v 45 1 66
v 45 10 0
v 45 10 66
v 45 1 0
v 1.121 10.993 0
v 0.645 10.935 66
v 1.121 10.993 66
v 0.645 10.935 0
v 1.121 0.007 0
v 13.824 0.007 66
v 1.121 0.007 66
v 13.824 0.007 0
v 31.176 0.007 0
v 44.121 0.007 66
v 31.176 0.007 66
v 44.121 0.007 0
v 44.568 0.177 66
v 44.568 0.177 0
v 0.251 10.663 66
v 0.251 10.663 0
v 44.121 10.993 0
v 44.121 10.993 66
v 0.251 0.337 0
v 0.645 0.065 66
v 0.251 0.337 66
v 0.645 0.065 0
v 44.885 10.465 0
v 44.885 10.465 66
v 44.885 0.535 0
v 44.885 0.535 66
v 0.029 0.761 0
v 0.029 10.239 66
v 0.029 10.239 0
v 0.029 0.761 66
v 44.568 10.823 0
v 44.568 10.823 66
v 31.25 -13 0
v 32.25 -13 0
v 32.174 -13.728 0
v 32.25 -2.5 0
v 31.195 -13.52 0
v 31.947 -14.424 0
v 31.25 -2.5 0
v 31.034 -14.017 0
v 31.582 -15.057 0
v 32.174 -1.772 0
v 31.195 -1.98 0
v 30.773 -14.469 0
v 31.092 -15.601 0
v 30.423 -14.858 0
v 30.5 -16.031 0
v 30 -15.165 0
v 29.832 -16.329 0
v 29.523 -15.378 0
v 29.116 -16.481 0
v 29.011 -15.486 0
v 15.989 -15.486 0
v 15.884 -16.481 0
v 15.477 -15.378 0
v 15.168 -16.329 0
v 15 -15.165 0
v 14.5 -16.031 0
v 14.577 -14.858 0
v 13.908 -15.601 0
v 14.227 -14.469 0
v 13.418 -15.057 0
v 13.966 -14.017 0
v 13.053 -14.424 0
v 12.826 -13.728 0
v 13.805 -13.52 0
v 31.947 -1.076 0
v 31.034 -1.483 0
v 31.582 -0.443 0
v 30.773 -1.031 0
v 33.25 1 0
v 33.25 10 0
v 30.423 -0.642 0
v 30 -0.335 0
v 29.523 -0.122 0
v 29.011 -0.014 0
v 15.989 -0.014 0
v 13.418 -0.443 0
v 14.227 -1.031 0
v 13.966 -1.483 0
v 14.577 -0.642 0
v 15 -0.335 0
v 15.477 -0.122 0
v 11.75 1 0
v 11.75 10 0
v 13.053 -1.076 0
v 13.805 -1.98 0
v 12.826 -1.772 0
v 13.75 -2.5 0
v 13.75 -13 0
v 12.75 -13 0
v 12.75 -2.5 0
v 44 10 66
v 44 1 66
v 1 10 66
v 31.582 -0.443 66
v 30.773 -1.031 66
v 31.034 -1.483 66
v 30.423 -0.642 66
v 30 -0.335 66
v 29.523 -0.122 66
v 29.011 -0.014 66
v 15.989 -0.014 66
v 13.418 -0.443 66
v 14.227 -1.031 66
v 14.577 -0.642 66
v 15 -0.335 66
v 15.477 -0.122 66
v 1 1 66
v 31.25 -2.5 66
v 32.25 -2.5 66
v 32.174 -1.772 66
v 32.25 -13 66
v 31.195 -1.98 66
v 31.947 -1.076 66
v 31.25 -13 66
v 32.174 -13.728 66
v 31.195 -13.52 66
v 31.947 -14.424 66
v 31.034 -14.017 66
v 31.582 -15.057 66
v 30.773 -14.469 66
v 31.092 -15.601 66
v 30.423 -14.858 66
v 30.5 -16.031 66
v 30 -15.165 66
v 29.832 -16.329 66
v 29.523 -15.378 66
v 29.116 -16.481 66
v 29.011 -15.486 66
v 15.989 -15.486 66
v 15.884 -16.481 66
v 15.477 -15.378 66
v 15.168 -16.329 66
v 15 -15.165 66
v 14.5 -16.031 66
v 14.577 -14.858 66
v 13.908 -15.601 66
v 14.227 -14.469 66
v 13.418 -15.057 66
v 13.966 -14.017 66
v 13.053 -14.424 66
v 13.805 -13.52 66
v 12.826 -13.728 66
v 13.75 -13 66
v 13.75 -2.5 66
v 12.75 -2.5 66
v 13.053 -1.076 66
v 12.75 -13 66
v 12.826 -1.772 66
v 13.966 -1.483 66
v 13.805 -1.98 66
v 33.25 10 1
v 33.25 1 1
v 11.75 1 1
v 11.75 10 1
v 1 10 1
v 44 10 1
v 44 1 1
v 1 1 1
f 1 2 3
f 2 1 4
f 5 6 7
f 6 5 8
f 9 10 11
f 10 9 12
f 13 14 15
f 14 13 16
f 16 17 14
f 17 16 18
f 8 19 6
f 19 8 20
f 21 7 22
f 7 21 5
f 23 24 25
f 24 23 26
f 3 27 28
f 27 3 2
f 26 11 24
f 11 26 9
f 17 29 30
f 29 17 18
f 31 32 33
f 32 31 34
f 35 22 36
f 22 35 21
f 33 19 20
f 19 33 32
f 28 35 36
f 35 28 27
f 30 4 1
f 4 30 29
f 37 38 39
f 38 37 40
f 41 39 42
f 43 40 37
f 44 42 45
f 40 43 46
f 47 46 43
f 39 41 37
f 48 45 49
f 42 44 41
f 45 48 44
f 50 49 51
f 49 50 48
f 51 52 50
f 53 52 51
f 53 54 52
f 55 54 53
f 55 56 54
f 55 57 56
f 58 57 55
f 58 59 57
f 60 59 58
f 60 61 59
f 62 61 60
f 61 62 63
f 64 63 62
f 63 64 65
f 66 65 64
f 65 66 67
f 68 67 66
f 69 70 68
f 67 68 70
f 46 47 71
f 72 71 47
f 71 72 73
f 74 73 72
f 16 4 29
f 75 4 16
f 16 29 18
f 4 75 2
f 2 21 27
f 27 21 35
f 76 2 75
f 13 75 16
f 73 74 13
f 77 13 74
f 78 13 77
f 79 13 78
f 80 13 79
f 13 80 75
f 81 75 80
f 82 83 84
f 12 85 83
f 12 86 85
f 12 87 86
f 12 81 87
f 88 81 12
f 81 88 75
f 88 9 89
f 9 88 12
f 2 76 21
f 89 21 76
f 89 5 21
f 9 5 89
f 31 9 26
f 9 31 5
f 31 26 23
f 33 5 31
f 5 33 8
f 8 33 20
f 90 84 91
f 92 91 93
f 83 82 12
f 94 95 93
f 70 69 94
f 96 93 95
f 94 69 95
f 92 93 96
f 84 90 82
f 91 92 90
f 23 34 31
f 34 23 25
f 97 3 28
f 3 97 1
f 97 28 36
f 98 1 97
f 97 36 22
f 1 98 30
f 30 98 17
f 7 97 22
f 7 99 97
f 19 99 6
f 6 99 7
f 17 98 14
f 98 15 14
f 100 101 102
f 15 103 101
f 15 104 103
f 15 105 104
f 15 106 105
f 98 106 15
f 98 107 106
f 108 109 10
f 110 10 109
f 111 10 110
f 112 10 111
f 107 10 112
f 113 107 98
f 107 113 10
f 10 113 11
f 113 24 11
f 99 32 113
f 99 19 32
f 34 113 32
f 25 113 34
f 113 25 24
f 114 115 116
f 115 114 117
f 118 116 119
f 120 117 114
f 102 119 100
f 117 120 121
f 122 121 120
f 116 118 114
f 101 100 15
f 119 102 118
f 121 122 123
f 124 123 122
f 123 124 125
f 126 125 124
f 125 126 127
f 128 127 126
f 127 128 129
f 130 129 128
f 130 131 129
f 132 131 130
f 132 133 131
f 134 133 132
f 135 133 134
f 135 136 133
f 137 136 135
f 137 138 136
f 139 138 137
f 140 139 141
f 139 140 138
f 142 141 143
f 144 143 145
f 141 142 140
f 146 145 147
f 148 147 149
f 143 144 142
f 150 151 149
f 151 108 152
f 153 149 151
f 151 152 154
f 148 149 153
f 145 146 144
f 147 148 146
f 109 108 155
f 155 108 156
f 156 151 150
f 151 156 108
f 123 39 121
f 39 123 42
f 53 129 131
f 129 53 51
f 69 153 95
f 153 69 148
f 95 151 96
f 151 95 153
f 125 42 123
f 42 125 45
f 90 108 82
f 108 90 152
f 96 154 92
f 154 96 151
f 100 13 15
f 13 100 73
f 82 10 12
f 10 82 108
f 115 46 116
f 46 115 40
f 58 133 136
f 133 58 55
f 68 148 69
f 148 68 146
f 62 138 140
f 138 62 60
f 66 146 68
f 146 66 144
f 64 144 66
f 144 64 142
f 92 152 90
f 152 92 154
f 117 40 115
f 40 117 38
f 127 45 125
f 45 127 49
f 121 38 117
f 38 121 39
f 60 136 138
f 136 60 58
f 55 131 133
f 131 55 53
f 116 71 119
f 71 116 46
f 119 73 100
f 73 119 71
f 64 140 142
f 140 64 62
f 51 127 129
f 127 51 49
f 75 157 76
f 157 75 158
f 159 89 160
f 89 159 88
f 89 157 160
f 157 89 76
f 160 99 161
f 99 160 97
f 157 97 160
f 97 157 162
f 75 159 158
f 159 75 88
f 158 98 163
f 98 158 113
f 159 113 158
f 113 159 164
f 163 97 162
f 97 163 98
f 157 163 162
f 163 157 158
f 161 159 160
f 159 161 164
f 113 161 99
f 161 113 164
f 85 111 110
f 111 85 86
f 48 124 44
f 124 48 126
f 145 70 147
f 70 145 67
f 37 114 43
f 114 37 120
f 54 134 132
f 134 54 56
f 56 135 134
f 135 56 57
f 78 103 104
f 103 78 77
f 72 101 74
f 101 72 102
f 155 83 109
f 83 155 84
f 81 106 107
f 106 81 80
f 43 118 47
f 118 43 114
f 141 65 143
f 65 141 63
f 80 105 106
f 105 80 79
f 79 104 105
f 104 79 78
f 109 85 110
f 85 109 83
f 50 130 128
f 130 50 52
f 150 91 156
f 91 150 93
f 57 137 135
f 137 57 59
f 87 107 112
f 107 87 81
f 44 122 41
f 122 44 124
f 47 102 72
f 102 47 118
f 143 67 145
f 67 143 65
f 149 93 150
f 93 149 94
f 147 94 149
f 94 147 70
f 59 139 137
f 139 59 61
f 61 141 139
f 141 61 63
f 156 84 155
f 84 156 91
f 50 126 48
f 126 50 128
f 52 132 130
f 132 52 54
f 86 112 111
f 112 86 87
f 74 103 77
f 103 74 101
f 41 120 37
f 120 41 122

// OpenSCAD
// Sealing (not just) for Ikea Korken
// https://www.thingiverse.com/thing:3724478
// Vilem Marsik, 2019
// CC BY-NC-SA
// https://creativecommons.org/licenses/by-nc-sa/4.0/


// wall thickness
wt=1;
// blade box height
zs=65;
// blade box X
xs=43;
// blade box Y
ys=9;
// handle X
xh=17.5;
// handle Y
yh=15.5;
// handle edge radius
re=3.5;

/* [Hidden] */
$fs=.5;

module rcube(xs,ys,zs,re)	{
	hull()
		for(x=[re,xs-re])
			for(y=[re,ys-re])
				translate([x,y,0])
					cylinder(r=re,h=zs);
}

difference()	{
	union()	{
		rcube(xs+2*wt,ys+2*wt,zs+wt,wt);
		translate([(xs-xh)/2,-yh-wt,0])
			rcube(xh+2*wt,yh+2*wt,zs+wt,re);
	}
	translate([xs/4+wt,wt,-1])
		cube([xs/2,ys,wt+2]);
	translate([wt,wt,wt])
		cube([xs,ys,zs+1]);
	translate([(xs-xh)/2+wt,-yh,-1])
		rcube(xh,yh,zs+wt+2,max(.1,re-wt));
}
